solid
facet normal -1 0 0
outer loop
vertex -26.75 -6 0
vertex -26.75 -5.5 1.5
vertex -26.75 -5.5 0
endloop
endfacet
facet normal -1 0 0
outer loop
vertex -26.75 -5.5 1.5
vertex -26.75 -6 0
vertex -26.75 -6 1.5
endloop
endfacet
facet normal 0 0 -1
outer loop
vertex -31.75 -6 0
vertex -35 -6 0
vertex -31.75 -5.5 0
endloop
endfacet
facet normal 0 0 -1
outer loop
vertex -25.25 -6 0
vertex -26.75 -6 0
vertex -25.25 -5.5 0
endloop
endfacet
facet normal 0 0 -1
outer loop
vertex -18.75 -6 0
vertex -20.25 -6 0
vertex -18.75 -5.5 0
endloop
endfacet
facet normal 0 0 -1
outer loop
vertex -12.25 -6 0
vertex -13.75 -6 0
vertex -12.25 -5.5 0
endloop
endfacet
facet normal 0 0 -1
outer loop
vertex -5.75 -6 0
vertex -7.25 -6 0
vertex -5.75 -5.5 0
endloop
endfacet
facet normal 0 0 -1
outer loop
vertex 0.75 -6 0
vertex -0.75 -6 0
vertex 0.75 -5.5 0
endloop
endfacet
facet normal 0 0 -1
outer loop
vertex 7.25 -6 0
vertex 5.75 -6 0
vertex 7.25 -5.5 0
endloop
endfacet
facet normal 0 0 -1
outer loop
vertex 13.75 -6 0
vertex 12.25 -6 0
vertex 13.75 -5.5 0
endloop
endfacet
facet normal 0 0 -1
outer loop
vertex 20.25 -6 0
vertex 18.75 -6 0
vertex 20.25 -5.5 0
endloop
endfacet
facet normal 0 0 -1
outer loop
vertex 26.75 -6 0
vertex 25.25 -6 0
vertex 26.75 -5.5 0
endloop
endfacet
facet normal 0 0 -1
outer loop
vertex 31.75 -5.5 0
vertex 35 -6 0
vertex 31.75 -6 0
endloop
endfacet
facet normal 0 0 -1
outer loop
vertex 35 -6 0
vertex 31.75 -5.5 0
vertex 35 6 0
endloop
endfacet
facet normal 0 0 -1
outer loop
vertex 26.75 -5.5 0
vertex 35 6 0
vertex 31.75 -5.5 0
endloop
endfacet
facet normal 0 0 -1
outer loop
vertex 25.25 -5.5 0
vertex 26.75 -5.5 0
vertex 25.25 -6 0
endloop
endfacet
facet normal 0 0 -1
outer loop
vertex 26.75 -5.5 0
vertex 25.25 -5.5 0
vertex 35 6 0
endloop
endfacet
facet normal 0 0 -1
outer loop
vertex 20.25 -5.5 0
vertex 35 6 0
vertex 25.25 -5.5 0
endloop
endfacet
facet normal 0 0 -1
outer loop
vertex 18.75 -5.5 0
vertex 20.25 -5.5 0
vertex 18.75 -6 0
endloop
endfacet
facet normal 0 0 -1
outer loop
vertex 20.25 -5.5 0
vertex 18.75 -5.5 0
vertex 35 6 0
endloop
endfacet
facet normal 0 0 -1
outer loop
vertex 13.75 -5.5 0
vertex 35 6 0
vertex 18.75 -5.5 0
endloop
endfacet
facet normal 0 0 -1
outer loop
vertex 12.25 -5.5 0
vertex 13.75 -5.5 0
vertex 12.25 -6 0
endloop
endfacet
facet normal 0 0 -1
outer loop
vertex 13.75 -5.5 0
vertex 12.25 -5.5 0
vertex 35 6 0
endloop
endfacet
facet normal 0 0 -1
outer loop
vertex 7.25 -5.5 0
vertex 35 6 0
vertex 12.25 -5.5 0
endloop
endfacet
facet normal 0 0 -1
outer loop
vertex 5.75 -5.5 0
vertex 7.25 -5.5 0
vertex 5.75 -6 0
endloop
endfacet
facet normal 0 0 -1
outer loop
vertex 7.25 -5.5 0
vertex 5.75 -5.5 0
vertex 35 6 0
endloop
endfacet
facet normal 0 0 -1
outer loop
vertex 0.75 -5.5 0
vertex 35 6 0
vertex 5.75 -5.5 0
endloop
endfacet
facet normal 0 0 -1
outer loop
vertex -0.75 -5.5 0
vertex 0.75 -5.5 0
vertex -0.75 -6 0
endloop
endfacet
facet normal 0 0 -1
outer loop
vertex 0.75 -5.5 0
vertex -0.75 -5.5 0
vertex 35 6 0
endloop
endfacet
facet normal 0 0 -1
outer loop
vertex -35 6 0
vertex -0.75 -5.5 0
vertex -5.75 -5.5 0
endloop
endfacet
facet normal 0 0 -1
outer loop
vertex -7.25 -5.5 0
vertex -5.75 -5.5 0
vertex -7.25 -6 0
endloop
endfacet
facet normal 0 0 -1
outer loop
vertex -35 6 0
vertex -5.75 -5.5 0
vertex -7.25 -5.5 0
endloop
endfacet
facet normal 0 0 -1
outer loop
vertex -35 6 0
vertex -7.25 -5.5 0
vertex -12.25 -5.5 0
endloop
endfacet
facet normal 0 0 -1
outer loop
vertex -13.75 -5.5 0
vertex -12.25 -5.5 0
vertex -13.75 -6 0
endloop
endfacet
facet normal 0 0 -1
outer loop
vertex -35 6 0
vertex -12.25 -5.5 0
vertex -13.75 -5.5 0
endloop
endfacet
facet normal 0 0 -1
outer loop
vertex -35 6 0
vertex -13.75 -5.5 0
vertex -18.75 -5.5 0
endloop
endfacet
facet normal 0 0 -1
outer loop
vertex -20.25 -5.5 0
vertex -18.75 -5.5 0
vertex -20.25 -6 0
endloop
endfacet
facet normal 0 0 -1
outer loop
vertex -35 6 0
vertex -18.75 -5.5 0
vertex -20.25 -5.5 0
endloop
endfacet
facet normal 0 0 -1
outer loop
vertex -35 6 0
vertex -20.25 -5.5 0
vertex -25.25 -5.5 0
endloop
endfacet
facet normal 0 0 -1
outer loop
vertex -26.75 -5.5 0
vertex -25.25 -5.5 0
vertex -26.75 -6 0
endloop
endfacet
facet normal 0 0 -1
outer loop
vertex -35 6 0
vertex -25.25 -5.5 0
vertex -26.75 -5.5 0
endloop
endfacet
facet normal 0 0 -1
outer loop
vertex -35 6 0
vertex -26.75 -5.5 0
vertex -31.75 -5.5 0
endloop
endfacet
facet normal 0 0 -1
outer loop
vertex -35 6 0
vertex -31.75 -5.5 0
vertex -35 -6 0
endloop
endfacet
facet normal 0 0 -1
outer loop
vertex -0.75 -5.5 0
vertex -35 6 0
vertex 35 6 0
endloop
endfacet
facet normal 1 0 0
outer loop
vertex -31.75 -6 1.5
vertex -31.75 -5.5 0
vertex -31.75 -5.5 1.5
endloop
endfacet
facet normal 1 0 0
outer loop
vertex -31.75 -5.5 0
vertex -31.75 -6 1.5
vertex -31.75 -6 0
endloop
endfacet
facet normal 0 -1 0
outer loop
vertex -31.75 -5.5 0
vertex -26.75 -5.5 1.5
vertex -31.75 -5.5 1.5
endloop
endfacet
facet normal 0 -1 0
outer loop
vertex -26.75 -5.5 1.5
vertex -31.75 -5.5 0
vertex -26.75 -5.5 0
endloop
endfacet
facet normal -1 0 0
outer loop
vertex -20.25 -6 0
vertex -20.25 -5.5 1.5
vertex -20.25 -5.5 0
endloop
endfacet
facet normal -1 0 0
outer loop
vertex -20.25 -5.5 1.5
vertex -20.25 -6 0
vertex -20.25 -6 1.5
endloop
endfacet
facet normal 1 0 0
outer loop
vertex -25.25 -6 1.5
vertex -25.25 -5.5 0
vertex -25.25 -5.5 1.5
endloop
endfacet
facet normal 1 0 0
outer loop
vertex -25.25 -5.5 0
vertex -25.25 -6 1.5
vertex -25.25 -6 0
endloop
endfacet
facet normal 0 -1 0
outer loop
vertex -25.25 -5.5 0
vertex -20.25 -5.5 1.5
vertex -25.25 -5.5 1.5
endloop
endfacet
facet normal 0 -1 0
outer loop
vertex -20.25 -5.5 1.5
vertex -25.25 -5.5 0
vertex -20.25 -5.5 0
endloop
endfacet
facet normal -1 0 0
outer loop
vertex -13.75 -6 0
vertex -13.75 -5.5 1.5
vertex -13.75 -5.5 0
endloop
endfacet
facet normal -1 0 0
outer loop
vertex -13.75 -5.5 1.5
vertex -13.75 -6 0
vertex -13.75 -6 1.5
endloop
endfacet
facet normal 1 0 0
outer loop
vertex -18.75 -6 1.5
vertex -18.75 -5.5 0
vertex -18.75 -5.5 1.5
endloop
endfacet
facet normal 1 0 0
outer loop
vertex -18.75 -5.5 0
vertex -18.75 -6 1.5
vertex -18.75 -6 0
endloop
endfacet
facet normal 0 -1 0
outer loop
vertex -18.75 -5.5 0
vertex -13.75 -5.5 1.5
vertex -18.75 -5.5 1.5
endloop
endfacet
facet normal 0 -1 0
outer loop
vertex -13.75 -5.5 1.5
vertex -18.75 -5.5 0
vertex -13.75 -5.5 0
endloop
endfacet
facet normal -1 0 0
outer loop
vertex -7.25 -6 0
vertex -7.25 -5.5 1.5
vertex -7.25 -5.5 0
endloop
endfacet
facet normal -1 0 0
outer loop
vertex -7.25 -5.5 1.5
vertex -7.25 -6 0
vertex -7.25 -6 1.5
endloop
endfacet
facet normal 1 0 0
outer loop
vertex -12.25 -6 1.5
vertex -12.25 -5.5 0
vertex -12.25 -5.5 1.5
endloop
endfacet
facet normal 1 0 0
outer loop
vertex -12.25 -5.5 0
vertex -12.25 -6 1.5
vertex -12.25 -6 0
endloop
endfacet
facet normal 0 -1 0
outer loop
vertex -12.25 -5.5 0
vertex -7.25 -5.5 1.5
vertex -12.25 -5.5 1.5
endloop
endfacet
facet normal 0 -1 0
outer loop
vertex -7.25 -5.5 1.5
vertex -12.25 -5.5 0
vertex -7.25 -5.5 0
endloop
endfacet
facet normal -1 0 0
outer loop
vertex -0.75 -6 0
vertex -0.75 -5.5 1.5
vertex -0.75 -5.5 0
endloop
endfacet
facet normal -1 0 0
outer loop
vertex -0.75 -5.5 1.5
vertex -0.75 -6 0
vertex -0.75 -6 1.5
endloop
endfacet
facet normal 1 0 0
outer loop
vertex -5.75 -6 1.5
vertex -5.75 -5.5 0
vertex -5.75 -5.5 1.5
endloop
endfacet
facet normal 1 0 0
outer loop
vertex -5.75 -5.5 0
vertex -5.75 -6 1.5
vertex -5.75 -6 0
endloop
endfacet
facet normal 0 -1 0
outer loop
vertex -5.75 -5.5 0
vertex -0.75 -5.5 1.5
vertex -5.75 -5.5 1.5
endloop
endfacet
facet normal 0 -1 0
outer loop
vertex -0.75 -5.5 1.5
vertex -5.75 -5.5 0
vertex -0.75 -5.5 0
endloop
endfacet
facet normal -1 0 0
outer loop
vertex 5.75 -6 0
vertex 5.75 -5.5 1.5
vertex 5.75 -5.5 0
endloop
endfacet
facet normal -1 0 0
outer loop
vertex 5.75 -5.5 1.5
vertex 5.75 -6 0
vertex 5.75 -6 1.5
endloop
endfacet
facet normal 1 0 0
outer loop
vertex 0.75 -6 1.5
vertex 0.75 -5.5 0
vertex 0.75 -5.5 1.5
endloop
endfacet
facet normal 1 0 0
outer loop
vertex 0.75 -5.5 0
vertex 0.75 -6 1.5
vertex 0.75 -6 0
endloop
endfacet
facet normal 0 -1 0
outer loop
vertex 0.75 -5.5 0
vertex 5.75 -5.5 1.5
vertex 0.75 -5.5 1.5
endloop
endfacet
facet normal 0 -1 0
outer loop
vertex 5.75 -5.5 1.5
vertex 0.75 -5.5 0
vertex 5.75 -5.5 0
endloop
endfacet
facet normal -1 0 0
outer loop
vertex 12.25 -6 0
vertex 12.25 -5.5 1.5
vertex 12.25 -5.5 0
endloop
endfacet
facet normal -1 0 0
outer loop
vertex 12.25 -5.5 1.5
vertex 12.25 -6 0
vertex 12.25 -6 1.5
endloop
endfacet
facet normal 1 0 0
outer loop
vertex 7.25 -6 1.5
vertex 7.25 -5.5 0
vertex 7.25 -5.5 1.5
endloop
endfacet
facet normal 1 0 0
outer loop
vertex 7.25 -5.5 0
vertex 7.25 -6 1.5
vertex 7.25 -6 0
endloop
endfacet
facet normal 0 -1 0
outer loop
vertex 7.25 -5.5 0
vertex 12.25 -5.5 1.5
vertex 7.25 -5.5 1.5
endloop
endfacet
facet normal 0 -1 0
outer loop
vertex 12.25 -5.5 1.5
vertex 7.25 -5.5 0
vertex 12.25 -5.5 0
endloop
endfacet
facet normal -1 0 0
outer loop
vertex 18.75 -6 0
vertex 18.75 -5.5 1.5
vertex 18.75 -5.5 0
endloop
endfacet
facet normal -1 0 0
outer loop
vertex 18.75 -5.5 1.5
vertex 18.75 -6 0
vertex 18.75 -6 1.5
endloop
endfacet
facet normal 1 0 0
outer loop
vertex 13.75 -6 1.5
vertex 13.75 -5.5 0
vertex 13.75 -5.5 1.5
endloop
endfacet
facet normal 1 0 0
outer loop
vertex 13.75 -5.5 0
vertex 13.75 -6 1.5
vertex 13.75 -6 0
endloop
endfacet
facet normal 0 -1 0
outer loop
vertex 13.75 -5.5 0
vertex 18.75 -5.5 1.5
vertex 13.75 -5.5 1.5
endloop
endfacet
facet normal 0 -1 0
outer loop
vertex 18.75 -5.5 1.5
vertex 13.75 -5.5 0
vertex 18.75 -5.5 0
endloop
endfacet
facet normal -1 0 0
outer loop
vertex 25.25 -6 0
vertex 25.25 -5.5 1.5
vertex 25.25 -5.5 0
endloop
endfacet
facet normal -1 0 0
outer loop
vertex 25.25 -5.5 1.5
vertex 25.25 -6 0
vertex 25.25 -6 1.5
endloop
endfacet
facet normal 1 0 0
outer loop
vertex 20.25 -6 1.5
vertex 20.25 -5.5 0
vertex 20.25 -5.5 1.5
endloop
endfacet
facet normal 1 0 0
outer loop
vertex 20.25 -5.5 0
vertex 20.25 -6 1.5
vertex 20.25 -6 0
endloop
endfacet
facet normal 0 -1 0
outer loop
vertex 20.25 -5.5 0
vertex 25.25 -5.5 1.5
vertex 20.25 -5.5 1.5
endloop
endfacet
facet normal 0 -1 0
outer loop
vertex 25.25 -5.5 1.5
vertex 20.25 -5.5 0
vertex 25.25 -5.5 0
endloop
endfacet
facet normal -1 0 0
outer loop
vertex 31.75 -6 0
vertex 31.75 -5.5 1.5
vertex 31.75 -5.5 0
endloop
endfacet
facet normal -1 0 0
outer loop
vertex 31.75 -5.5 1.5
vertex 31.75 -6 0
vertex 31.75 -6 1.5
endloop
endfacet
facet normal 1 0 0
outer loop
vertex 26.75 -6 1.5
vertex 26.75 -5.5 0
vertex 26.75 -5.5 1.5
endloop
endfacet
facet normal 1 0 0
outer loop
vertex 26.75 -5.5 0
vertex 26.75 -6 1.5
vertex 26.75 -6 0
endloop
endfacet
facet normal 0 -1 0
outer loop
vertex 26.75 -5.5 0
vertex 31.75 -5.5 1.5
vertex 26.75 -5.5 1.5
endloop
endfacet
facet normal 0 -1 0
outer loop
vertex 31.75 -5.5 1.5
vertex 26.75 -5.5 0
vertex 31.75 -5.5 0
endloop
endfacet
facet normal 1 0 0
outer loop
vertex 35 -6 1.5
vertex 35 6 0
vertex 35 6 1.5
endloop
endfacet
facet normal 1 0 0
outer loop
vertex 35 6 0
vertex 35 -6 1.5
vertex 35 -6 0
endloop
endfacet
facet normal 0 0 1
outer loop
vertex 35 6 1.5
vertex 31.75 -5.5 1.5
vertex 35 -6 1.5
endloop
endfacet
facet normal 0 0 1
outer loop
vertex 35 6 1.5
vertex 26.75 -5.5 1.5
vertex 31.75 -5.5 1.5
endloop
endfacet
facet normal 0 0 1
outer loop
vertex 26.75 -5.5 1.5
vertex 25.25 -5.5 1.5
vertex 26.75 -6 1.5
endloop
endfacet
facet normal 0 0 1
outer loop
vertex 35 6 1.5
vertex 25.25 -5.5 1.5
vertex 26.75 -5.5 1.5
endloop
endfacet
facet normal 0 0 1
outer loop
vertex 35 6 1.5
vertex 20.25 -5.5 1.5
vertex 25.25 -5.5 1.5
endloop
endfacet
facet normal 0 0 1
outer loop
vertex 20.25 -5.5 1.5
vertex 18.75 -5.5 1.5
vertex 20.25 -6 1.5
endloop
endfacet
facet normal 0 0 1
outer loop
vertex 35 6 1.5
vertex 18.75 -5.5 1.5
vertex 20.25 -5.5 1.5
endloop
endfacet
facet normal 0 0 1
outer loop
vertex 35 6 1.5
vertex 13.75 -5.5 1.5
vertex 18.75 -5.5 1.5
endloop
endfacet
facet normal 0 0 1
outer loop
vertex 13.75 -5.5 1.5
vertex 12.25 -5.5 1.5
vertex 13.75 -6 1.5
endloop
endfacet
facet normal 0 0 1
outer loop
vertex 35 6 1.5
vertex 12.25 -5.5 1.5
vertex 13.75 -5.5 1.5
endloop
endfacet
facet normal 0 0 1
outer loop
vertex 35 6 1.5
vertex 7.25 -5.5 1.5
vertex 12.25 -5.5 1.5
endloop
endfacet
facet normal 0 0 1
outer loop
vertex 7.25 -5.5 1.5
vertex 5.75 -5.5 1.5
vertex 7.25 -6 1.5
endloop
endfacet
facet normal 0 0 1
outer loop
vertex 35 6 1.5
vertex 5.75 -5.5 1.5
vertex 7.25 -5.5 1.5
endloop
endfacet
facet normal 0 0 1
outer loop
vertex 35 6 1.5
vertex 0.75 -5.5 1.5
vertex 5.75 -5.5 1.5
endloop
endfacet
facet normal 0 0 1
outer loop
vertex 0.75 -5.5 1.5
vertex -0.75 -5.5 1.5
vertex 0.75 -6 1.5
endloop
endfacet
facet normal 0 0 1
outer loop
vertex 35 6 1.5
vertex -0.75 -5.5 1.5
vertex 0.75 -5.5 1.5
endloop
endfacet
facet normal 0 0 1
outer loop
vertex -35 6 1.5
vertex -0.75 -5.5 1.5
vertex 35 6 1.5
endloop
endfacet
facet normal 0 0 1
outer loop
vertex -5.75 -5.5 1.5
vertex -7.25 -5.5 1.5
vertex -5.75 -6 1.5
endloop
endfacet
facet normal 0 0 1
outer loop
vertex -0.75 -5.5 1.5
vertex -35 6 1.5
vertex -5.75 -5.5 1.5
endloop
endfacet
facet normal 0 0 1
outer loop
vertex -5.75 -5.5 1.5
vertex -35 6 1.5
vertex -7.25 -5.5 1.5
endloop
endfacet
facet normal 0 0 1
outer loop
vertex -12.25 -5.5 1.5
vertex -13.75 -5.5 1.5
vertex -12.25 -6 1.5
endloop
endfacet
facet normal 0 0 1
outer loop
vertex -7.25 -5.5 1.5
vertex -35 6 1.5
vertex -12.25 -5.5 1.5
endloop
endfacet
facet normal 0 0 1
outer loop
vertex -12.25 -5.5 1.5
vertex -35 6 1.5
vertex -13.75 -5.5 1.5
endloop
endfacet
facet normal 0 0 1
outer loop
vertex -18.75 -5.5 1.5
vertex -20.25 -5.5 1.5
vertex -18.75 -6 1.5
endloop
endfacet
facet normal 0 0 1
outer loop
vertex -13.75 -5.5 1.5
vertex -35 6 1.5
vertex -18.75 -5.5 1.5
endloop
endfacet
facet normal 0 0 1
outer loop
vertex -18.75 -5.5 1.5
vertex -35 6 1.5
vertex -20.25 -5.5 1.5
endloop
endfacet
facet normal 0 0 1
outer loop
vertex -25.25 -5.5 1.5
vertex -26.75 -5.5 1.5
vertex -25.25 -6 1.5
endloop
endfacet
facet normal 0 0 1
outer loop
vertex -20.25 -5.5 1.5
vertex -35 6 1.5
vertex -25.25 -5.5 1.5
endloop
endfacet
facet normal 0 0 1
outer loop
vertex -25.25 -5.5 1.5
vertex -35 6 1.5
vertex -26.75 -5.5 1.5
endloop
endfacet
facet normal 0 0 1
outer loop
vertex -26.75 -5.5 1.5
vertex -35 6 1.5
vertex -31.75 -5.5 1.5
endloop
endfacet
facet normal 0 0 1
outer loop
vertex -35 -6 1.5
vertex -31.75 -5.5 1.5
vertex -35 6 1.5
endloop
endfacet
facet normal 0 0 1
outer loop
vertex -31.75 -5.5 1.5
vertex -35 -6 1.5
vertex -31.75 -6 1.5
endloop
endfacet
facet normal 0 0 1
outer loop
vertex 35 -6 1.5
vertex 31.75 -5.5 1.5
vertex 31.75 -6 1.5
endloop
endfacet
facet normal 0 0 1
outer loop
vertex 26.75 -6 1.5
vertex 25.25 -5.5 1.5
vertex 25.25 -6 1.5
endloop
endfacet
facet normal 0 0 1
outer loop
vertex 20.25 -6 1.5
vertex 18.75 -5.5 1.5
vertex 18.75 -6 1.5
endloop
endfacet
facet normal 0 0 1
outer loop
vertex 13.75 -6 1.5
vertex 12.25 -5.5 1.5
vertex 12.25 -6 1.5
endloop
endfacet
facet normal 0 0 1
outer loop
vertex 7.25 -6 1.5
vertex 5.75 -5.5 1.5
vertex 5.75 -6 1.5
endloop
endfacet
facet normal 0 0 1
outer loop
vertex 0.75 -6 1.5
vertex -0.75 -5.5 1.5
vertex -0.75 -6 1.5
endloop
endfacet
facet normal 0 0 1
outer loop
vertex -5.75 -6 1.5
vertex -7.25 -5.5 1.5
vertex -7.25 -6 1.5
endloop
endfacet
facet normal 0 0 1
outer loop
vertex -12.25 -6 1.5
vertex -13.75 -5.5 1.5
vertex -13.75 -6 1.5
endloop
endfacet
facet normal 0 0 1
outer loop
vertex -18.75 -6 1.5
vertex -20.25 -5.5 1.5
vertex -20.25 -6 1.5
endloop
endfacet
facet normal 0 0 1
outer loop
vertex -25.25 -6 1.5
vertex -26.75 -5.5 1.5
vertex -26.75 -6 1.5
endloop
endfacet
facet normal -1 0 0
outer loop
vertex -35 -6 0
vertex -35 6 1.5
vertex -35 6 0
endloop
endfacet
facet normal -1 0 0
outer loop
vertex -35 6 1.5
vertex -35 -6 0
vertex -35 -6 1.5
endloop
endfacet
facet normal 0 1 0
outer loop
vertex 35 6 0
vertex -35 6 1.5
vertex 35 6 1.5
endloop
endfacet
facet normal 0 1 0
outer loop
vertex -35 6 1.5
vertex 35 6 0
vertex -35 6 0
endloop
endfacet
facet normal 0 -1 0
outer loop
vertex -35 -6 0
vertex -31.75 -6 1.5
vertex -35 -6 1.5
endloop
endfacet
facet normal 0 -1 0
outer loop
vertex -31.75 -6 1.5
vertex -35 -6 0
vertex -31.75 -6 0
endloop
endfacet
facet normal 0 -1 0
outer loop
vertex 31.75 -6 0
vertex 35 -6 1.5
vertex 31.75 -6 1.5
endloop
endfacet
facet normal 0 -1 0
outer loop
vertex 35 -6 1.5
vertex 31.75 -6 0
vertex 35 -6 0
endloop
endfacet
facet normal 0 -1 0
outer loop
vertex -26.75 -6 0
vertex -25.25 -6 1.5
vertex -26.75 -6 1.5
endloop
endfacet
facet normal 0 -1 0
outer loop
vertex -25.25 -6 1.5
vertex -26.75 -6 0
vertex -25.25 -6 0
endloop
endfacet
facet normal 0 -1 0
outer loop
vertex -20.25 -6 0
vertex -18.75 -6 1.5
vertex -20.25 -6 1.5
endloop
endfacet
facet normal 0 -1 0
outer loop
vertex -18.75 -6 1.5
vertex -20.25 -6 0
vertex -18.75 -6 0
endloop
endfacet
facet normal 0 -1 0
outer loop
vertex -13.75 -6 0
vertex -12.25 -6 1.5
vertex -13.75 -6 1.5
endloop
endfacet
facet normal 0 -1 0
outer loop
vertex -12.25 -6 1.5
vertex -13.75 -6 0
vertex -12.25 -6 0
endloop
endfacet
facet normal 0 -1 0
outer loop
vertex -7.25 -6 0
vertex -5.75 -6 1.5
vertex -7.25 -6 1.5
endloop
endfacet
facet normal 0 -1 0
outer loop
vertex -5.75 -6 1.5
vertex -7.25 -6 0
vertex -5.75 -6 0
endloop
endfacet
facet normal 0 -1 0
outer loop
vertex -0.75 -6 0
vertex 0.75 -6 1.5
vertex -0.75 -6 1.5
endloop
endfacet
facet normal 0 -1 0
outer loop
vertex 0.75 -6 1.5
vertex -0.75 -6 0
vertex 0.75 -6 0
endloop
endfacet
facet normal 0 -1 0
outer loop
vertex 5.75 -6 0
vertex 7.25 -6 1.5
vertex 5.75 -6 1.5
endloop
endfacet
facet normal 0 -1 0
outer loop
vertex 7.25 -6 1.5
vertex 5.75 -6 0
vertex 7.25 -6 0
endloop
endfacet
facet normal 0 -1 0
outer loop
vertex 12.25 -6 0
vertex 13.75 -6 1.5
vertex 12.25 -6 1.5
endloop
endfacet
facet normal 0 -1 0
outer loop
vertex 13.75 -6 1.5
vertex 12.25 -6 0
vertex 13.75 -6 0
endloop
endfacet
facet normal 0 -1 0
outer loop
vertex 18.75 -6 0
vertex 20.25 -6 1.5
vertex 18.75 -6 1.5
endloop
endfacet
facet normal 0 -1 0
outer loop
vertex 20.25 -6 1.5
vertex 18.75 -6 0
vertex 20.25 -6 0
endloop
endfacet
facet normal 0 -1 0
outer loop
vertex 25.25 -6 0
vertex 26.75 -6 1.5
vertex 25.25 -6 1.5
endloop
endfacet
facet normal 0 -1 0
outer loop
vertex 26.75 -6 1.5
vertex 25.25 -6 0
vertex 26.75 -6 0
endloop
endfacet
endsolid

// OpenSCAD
// 10-well agarose gel comb - printed lying flat
// Units: mm

// ---------- Parameters ----------
plate_thk     = 1.5;    // plate thickness (Z)
spine_len     = 70;     // spine length (X)
spine_wid     = 12;     // spine width (Y)
tooth_count   = 10;     // number of teeth
tooth_w       = 5.0;    // tooth width (X)
tooth_len     = 12;     // tooth length (Y)
gap           = 1.5;    // gap between teeth (X)
overcut       = 0.5;    // extra length on cutters past faces
$fn           = 64;     // curve resolution

// ---------- Derived ----------
pitch   = tooth_w + gap;                 // centre-to-centre tooth spacing
x0      = -(tooth_count - 1) * pitch / 2; // first tooth centre (row centred)
teeth_span = (tooth_count - 1) * pitch + tooth_w; // distance first-to-last tooth

// ---------- Model ----------
difference() {
    // Base plate
    translate([-spine_len/2, -spine_wid/2, 0])
        cube([spine_len, spine_wid, plate_thk]);

    // Teeth hanging in -Y from the spine
    for (i = [0 : tooth_count - 1])
        translate([x0 + i * pitch - tooth_w/2, -spine_wid/2 - tooth_len, 0])
            cube([tooth_w, tooth_len + overcut, plate_thk + overcut]);
}
